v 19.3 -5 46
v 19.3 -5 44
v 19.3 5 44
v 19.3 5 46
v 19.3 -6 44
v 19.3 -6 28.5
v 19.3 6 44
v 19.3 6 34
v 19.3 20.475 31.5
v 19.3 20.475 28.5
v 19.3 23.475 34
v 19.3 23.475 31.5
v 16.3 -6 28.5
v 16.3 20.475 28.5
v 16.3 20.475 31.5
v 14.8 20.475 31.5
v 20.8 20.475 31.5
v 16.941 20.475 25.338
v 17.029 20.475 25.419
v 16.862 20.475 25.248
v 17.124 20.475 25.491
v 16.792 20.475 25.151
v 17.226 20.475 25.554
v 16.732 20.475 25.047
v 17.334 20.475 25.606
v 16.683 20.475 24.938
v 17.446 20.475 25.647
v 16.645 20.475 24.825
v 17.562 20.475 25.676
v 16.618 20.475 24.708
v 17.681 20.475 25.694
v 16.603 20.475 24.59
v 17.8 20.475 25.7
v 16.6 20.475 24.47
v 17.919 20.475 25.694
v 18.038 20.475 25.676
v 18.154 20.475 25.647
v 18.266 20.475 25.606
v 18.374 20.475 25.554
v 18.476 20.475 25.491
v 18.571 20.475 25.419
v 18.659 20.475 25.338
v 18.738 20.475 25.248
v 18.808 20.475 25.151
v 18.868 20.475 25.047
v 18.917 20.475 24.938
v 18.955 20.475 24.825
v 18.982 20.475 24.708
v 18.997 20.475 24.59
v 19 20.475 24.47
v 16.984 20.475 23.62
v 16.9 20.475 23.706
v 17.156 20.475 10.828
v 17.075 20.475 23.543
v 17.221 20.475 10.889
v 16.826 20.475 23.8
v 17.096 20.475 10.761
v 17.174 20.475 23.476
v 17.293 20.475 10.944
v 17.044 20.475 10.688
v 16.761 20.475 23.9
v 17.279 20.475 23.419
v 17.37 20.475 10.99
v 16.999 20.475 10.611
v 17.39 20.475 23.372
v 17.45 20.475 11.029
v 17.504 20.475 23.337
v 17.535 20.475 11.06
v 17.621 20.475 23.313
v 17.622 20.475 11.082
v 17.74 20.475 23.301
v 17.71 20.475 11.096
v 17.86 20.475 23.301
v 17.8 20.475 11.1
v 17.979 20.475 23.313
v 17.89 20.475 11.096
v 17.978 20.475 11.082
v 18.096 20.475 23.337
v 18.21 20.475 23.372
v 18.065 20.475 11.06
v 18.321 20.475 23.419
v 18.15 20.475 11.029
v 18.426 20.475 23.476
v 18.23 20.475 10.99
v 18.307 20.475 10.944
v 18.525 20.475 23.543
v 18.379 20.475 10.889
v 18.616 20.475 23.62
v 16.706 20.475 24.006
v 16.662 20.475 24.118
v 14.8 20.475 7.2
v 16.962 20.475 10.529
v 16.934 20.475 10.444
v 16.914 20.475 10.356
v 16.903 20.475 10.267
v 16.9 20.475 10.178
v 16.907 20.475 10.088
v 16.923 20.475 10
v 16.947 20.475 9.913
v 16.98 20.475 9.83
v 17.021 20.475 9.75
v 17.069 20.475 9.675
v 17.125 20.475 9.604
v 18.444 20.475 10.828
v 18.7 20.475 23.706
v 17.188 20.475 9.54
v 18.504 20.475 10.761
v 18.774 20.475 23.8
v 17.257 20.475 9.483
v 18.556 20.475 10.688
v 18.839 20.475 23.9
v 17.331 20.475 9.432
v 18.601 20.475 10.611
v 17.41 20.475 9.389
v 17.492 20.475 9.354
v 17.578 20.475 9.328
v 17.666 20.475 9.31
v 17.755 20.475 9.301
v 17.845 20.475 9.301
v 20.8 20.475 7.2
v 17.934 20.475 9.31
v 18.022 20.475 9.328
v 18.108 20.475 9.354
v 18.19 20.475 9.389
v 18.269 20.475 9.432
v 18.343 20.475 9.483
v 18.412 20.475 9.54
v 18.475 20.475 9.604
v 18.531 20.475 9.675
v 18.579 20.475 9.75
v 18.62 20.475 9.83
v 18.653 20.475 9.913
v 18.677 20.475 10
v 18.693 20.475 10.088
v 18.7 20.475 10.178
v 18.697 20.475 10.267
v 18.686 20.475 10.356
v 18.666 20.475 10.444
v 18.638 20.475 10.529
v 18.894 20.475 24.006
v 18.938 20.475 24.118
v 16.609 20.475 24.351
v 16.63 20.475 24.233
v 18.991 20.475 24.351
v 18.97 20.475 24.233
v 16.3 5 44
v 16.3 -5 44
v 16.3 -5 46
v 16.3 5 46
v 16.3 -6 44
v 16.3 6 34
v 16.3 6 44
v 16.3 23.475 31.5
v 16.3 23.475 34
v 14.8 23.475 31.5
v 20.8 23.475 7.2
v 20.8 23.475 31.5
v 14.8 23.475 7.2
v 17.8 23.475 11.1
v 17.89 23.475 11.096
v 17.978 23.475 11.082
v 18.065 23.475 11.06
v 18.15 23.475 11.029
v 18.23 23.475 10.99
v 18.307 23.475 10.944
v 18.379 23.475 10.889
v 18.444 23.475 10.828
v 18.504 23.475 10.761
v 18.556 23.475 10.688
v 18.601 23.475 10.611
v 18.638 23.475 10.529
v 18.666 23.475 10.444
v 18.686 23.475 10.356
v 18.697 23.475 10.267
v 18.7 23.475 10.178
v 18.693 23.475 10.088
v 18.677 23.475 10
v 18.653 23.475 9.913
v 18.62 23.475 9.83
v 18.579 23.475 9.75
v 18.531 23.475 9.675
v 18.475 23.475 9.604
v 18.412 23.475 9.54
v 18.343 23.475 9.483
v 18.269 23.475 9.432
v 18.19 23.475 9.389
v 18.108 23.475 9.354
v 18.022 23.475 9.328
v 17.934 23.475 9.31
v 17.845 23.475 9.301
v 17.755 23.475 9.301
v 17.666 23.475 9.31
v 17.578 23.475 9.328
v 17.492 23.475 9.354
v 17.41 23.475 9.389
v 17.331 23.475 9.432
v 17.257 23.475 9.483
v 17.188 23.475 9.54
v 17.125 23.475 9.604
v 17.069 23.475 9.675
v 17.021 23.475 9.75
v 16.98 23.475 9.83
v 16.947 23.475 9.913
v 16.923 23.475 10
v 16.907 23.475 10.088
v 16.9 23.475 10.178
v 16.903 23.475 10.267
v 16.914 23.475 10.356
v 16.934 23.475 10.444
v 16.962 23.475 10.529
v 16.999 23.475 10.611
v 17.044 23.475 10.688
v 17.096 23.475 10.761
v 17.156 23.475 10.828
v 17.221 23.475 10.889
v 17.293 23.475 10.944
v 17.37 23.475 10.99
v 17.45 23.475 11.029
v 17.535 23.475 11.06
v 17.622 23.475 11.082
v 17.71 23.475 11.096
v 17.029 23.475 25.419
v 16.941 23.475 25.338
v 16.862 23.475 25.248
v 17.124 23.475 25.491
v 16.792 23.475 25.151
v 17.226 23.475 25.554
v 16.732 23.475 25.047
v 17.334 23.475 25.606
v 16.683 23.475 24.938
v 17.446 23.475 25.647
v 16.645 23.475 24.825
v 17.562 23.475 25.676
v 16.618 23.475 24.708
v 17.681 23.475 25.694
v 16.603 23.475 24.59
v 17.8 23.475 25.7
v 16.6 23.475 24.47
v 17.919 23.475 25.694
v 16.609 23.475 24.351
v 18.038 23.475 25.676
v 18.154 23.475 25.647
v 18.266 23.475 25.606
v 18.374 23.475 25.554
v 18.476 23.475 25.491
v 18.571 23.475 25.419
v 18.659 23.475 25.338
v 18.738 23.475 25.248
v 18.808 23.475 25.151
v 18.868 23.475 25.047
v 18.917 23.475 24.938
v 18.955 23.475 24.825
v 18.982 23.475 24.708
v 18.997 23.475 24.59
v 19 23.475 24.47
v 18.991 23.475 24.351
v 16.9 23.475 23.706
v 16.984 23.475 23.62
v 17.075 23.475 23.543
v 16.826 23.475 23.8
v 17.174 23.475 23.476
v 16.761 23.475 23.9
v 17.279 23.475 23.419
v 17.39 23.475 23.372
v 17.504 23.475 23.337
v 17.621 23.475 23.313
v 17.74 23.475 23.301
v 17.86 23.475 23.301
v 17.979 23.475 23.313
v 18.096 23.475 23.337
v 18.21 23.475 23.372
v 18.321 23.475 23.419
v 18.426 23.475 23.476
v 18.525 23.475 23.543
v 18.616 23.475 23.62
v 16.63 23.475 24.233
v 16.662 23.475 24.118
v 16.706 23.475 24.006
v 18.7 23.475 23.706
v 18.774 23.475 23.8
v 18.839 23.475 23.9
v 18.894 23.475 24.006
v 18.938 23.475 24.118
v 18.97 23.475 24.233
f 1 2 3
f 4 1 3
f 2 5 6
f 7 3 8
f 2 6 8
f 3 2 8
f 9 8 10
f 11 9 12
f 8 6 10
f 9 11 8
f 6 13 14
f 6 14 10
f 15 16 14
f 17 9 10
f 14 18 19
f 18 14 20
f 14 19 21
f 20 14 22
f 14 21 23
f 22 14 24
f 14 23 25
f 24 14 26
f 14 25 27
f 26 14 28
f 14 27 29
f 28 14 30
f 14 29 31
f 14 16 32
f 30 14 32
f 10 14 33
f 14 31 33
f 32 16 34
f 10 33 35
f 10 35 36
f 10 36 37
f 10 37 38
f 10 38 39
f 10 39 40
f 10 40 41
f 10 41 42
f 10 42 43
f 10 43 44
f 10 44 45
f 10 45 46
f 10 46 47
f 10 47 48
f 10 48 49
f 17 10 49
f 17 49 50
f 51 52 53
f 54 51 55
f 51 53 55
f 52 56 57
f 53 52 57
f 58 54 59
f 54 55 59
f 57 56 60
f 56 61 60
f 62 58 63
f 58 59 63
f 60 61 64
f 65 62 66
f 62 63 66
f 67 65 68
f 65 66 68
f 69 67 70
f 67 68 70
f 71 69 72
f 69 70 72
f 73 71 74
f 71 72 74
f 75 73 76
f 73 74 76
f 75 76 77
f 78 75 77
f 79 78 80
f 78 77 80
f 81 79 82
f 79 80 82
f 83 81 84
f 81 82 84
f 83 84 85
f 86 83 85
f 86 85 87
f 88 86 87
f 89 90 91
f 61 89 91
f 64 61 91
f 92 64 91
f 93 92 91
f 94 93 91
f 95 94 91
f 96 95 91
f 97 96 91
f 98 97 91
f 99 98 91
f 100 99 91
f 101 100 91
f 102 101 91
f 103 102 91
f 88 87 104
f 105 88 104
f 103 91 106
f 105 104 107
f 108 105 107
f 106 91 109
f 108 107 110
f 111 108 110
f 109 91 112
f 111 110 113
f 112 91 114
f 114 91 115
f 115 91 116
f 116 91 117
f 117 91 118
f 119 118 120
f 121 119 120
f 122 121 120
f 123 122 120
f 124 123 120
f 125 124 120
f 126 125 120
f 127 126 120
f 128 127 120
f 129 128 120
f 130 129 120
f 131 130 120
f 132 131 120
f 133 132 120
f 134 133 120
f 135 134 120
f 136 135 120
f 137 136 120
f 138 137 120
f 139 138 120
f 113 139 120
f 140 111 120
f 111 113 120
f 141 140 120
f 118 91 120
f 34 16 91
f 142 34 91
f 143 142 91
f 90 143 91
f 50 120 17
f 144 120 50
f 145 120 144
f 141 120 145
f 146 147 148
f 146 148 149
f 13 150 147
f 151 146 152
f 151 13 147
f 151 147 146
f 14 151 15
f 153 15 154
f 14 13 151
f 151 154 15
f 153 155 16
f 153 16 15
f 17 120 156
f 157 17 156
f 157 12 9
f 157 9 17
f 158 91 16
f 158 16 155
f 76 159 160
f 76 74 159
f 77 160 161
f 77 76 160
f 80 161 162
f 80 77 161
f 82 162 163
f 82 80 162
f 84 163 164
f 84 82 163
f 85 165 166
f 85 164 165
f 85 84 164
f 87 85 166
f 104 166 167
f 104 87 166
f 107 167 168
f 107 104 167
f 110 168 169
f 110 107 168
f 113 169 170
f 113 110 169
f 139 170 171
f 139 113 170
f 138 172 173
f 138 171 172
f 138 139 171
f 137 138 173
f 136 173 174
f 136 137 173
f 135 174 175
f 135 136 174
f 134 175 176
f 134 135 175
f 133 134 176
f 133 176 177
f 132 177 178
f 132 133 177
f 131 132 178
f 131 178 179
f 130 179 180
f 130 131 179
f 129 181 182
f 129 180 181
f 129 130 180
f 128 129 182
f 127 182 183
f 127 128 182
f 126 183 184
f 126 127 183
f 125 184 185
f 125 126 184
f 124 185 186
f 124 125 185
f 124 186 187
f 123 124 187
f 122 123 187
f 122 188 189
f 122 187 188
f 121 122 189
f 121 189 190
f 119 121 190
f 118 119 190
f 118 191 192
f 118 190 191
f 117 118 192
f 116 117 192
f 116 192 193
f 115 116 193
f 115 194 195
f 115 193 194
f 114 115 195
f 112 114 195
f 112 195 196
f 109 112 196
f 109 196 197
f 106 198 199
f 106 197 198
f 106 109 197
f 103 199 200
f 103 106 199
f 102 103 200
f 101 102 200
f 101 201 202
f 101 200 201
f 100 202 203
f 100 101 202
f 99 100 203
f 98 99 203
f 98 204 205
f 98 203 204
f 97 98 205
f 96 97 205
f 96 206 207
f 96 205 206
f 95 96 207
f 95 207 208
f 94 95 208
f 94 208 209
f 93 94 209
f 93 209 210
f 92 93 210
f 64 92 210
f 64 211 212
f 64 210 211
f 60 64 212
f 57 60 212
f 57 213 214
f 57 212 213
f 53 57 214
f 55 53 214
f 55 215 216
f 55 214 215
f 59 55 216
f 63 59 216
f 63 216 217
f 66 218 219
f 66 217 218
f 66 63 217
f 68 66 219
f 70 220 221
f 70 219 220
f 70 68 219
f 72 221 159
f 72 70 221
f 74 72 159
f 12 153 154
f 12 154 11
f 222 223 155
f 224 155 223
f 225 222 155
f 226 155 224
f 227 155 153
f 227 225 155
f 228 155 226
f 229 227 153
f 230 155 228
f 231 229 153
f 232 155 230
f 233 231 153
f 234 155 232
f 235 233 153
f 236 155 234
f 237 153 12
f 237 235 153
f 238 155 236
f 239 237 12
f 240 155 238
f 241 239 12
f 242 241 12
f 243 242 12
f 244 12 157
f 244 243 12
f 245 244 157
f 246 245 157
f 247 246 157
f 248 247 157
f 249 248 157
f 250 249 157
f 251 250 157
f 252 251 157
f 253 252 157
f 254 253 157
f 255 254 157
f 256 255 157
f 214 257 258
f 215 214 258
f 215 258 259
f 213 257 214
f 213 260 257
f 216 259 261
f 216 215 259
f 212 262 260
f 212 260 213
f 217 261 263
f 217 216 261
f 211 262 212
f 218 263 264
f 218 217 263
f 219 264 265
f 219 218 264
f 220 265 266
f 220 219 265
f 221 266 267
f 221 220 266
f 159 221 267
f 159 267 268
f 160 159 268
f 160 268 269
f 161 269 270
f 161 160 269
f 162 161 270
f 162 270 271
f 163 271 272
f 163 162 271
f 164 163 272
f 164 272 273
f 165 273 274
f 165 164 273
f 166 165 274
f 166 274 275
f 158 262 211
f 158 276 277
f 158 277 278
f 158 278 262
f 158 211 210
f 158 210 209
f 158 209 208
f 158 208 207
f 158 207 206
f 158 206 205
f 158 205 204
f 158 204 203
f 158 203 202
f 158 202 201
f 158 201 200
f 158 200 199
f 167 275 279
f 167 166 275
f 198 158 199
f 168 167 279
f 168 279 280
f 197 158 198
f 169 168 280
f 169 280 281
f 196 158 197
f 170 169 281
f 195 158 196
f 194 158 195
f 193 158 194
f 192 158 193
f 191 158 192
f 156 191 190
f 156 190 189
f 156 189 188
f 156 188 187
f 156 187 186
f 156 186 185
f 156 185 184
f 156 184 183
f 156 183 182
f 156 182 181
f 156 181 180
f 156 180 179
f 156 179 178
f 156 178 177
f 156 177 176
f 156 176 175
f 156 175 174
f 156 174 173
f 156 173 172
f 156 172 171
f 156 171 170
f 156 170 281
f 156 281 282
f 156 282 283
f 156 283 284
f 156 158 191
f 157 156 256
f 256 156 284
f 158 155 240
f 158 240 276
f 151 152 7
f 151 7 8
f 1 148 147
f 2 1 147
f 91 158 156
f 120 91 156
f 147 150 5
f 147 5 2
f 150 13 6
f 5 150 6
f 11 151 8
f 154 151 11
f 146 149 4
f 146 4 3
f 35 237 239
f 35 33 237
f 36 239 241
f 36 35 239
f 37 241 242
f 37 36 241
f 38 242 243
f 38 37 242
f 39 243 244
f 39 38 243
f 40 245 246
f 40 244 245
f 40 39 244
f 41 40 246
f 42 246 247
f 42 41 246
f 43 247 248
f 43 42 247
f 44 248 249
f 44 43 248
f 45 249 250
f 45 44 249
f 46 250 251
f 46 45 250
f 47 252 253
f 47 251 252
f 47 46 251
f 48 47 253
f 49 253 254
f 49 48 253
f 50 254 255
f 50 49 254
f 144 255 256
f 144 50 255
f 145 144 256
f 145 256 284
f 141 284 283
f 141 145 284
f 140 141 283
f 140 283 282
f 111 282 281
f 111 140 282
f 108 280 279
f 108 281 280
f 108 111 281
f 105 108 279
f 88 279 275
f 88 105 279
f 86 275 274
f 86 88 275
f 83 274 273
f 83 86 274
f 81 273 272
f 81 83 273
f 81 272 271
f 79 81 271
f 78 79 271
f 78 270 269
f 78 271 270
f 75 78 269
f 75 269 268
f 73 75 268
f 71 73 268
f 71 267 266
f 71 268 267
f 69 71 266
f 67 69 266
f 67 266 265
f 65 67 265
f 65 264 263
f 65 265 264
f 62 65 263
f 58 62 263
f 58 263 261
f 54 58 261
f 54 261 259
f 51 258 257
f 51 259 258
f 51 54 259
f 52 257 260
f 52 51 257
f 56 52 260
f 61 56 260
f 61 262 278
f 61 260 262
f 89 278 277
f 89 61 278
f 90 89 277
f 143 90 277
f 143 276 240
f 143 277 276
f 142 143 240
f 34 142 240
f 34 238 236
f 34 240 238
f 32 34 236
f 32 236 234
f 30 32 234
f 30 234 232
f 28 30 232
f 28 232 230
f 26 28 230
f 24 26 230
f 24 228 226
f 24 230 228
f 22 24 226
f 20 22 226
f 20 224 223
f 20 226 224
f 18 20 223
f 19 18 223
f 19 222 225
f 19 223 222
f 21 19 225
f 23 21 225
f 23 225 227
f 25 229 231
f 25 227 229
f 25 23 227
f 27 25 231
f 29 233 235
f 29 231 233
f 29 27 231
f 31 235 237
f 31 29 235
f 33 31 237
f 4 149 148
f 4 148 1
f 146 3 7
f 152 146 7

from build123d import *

# Parameters (mm, degrees)
BOSS_EXTRUDE1_START     = 7.2
SKETCH1_W               = 6
SKETCH1_H               = 3
BOSS_EXTRUDE1_DEPTH     = 24.3
BOSS_EXTRUDE2_START     = 28.5
SKETCH2_W               = 3
SKETCH2_H               = 29.475
BOSS_EXTRUDE2_DEPTH     = 17.5
CUT_EXTRUDE1_DEPTH      = 56.675089807
CUT_EXTRUDE1_DEPTH_BACK = 56.675089807
SKETCH3_R               = 1.2
SKETCH3_R_2             = 0.9
CUT_EXTRUDE2_DEPTH      = 56.675089807
CUT_EXTRUDE2_DEPTH_BACK = 56.675089807
SKETCH4_W               = 13
SKETCH4_H               = 18.475
CUT_EXTRUDE3_DEPTH      = 56.675089807
CUT_EXTRUDE3_DEPTH_BACK = 56.675089807
SKETCH5_W               = 3
SKETCH5_H               = 2.5


with BuildPart() as part:
    # Sketch1 → Boss-Extrude1 (new body)
    with BuildSketch(Plane.XY.offset(BOSS_EXTRUDE1_START)):
        with Locations((17.8, 21.975)):
            Rectangle(SKETCH1_W, SKETCH1_H)
    extrude(amount=BOSS_EXTRUDE1_DEPTH)

    # Sketch2 → Boss-Extrude2 (add)
    with BuildSketch(Plane.XY.offset(BOSS_EXTRUDE2_START)):
        with Locations((17.8, 8.7375)):
            Rectangle(SKETCH2_W, SKETCH2_H)
    extrude(amount=BOSS_EXTRUDE2_DEPTH)

    # Sketch3 → Cut-Extrude1 (cut, two sides: drawn at the far end of the back side and taken through both)
    with BuildSketch(Plane(origin=(0, 0, 0), x_dir=(1, 0, 0), z_dir=(0, 1, 0)).offset(-CUT_EXTRUDE1_DEPTH_BACK)):
        with Locations(Location((17.8, -24.5, 0), (0, 0, 270))):
            Circle(SKETCH3_R)
        with Locations(Location((17.8, -10.2, 0), (0, 0, 270))):
            Circle(SKETCH3_R_2)
    extrude(amount=CUT_EXTRUDE1_DEPTH + CUT_EXTRUDE1_DEPTH_BACK, mode=Mode.SUBTRACT)

    # Sketch4 → Cut-Extrude2 (cut, two sides: drawn at the far end of the back side and taken through both)
    with BuildSketch(Plane(origin=(0, 0, 0), x_dir=(0, 0, -1), z_dir=(1, 0, 0)).offset(-CUT_EXTRUDE2_DEPTH_BACK)):
        with Locations((-40.5, 15.2375)):
            Rectangle(SKETCH4_W, SKETCH4_H)
    extrude(amount=CUT_EXTRUDE2_DEPTH + CUT_EXTRUDE2_DEPTH_BACK, mode=Mode.SUBTRACT)

    # Sketch5 → Cut-Extrude3 (cut, two sides: drawn at the far end of the back side and taken through both)
    with BuildSketch(Plane(origin=(0, 0, 0), x_dir=(0, 0, -1), z_dir=(1, 0, 0)).offset(-CUT_EXTRUDE3_DEPTH_BACK)):
        with Locations((-45.5, -6.25)):
            Rectangle(SKETCH5_W, SKETCH5_H)
        with Locations((-45.5, 6.25)):
            Rectangle(SKETCH5_W, SKETCH5_H)
    extrude(amount=CUT_EXTRUDE3_DEPTH + CUT_EXTRUDE3_DEPTH_BACK, mode=Mode.SUBTRACT)


solid = part.part
